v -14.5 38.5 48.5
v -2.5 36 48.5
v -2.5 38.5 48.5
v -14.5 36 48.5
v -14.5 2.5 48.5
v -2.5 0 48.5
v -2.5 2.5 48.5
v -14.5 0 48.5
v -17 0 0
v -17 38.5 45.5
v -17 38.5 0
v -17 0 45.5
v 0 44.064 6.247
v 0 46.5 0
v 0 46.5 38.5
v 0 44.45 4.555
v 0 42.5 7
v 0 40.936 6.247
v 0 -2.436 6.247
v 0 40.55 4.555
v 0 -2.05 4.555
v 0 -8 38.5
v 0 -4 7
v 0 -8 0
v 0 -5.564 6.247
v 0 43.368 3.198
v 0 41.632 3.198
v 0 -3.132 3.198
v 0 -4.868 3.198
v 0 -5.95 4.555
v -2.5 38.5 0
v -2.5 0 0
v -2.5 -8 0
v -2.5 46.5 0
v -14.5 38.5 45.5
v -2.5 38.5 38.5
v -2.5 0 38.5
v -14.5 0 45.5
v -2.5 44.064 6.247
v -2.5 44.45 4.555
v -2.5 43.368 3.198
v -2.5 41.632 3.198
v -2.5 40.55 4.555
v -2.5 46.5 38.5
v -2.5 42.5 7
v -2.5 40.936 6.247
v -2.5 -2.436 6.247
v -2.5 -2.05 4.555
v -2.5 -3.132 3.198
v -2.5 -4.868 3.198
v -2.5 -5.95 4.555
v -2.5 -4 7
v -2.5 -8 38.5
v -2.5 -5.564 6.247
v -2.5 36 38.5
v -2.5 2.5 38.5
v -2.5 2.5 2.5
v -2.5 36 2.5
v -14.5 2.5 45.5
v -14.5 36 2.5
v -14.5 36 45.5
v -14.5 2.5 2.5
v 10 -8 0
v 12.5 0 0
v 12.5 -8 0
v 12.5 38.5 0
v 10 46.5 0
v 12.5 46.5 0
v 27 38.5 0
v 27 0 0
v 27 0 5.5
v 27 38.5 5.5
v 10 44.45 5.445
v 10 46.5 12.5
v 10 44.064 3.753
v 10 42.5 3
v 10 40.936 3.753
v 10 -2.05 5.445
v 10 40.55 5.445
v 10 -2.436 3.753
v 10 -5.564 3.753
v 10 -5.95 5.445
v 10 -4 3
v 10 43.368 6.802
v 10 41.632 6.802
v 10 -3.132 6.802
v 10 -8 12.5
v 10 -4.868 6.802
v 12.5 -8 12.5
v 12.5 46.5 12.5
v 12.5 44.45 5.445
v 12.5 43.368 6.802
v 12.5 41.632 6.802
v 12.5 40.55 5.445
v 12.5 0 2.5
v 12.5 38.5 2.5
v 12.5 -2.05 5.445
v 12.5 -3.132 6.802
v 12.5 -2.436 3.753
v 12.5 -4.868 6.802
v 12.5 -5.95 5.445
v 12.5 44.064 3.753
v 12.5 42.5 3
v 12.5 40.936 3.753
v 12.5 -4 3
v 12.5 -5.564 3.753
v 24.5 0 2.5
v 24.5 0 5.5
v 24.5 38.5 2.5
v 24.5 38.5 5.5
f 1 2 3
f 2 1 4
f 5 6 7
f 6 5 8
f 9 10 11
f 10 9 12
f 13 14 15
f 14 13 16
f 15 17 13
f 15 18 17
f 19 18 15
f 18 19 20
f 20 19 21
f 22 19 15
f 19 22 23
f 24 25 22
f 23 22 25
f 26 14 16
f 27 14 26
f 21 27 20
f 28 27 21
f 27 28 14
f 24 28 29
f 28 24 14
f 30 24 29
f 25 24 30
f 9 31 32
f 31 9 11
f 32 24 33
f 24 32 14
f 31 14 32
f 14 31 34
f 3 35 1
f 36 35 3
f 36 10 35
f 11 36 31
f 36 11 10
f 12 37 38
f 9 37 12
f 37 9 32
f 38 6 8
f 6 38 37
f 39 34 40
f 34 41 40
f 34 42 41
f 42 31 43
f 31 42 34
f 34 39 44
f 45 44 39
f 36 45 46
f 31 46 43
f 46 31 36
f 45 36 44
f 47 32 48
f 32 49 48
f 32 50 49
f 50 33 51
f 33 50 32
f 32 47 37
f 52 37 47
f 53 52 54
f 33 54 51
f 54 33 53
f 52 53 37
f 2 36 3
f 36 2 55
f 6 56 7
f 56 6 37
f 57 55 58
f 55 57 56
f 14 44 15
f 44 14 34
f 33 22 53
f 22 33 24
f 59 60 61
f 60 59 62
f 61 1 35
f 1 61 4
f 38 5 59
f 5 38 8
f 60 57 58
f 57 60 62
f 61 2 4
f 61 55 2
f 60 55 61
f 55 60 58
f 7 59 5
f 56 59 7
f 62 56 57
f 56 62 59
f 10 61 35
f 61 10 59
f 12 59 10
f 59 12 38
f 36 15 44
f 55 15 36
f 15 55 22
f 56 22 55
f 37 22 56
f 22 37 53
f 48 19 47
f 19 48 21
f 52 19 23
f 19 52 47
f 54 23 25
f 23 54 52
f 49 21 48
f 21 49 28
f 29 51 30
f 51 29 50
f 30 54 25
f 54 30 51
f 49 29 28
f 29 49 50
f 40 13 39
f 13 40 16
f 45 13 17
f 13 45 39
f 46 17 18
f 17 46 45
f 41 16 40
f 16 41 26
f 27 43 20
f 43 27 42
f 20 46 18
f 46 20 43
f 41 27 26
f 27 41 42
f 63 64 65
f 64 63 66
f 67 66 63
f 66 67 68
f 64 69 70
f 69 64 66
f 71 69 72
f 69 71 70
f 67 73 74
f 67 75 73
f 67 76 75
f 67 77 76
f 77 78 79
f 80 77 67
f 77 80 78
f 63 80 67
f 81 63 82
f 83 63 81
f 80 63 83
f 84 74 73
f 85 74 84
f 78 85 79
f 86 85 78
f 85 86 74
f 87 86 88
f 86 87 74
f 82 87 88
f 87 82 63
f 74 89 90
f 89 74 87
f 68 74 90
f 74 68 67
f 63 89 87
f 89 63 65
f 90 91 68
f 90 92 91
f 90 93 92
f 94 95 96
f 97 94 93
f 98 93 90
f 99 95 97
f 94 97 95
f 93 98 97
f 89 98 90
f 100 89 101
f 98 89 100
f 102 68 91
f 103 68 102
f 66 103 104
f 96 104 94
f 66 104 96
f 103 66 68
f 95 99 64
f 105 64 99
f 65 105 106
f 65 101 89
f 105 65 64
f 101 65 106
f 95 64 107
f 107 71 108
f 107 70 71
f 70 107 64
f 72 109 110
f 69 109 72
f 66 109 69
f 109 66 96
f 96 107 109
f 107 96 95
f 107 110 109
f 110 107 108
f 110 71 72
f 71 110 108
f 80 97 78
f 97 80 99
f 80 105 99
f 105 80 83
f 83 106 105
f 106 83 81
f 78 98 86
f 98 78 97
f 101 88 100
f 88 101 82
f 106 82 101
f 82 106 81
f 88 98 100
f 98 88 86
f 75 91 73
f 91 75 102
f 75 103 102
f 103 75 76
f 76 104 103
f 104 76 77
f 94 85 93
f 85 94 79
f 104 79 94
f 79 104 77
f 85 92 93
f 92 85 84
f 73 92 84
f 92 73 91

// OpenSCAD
insideWidth = 33.5;
insideHeight = 12;
insideLength = 46;


holderWidth = 8;
wallThickness = 2.5;

totalLength = insideLength + wallThickness;
totalWidth = insideWidth + 2 * wallThickness;
totalHeight = insideHeight + 2 * wallThickness;

holeDistanceFromEnd = 5;
endCapMaxLength = 10;

rotate(a=[0,-90,0]) {
difference() {
  union() {
    cube([
    insideLength + wallThickness, 
    insideWidth + 2 * wallThickness,
    insideHeight + 2 * wallThickness], false);
    translate([0, -holderWidth, 0])
      cube([
      insideLength + wallThickness, 
      insideWidth + 2 * wallThickness + 2 * holderWidth,
      wallThickness], false);
  }
    
    translate([wallThickness,wallThickness,wallThickness]) 
    cube([
    insideLength +2 , 
    insideWidth,
    insideHeight], false);
  
    //yläreunan kolo 
    translate([totalLength-3, -holderWidth-1, insideHeight + wallThickness])
      cube([10,totalWidth + 2 * holderWidth +2,wallThickness+1], false);
    //alareunan kolo
    translate([totalLength-10, -holderWidth-1, -1])
      cube([10,totalWidth + 2 * holderWidth +2,wallThickness+1], false);

    translate([holeDistanceFromEnd,-4,-1])
      cylinder(wallThickness+2, 2,2,false);
    translate([holeDistanceFromEnd, totalWidth + 4,-1])
      cylinder(wallThickness+2, 2,2,false);
}
}


translate([10, -holderWidth, 10 + wallThickness])
rotate(a=[0,90,0]) {

difference() {
  cube([10 + wallThickness,totalWidth + 2 * holderWidth,totalHeight], false);
  translate([-1,-1,wallThickness])
    cube([10 + wallThickness+2,holderWidth+1, insideHeight + wallThickness +1], false);
  translate([-1,holderWidth + insideWidth + 2 * wallThickness,wallThickness])
    cube([10 + wallThickness+2,holderWidth+1, insideHeight + wallThickness +1], false);
  translate([-1,0,wallThickness])
    cube([10+1,insideWidth + 2 * holderWidth, insideHeight], false);
  translate([-1,0,wallThickness + insideHeight-1])
    cube([10 - 2,insideWidth + 2 * holderWidth, insideHeight], false);
  
    //ruuvinreiät
  translate([10 + wallThickness - holeDistanceFromEnd,holderWidth - 4,-1])
    cylinder(wallThickness+2, 2,2,false);
  translate([10 + wallThickness - holeDistanceFromEnd, totalWidth + holderWidth + 4 ,-1])
    cylinder(wallThickness+2, 2,2,false);
}
}
